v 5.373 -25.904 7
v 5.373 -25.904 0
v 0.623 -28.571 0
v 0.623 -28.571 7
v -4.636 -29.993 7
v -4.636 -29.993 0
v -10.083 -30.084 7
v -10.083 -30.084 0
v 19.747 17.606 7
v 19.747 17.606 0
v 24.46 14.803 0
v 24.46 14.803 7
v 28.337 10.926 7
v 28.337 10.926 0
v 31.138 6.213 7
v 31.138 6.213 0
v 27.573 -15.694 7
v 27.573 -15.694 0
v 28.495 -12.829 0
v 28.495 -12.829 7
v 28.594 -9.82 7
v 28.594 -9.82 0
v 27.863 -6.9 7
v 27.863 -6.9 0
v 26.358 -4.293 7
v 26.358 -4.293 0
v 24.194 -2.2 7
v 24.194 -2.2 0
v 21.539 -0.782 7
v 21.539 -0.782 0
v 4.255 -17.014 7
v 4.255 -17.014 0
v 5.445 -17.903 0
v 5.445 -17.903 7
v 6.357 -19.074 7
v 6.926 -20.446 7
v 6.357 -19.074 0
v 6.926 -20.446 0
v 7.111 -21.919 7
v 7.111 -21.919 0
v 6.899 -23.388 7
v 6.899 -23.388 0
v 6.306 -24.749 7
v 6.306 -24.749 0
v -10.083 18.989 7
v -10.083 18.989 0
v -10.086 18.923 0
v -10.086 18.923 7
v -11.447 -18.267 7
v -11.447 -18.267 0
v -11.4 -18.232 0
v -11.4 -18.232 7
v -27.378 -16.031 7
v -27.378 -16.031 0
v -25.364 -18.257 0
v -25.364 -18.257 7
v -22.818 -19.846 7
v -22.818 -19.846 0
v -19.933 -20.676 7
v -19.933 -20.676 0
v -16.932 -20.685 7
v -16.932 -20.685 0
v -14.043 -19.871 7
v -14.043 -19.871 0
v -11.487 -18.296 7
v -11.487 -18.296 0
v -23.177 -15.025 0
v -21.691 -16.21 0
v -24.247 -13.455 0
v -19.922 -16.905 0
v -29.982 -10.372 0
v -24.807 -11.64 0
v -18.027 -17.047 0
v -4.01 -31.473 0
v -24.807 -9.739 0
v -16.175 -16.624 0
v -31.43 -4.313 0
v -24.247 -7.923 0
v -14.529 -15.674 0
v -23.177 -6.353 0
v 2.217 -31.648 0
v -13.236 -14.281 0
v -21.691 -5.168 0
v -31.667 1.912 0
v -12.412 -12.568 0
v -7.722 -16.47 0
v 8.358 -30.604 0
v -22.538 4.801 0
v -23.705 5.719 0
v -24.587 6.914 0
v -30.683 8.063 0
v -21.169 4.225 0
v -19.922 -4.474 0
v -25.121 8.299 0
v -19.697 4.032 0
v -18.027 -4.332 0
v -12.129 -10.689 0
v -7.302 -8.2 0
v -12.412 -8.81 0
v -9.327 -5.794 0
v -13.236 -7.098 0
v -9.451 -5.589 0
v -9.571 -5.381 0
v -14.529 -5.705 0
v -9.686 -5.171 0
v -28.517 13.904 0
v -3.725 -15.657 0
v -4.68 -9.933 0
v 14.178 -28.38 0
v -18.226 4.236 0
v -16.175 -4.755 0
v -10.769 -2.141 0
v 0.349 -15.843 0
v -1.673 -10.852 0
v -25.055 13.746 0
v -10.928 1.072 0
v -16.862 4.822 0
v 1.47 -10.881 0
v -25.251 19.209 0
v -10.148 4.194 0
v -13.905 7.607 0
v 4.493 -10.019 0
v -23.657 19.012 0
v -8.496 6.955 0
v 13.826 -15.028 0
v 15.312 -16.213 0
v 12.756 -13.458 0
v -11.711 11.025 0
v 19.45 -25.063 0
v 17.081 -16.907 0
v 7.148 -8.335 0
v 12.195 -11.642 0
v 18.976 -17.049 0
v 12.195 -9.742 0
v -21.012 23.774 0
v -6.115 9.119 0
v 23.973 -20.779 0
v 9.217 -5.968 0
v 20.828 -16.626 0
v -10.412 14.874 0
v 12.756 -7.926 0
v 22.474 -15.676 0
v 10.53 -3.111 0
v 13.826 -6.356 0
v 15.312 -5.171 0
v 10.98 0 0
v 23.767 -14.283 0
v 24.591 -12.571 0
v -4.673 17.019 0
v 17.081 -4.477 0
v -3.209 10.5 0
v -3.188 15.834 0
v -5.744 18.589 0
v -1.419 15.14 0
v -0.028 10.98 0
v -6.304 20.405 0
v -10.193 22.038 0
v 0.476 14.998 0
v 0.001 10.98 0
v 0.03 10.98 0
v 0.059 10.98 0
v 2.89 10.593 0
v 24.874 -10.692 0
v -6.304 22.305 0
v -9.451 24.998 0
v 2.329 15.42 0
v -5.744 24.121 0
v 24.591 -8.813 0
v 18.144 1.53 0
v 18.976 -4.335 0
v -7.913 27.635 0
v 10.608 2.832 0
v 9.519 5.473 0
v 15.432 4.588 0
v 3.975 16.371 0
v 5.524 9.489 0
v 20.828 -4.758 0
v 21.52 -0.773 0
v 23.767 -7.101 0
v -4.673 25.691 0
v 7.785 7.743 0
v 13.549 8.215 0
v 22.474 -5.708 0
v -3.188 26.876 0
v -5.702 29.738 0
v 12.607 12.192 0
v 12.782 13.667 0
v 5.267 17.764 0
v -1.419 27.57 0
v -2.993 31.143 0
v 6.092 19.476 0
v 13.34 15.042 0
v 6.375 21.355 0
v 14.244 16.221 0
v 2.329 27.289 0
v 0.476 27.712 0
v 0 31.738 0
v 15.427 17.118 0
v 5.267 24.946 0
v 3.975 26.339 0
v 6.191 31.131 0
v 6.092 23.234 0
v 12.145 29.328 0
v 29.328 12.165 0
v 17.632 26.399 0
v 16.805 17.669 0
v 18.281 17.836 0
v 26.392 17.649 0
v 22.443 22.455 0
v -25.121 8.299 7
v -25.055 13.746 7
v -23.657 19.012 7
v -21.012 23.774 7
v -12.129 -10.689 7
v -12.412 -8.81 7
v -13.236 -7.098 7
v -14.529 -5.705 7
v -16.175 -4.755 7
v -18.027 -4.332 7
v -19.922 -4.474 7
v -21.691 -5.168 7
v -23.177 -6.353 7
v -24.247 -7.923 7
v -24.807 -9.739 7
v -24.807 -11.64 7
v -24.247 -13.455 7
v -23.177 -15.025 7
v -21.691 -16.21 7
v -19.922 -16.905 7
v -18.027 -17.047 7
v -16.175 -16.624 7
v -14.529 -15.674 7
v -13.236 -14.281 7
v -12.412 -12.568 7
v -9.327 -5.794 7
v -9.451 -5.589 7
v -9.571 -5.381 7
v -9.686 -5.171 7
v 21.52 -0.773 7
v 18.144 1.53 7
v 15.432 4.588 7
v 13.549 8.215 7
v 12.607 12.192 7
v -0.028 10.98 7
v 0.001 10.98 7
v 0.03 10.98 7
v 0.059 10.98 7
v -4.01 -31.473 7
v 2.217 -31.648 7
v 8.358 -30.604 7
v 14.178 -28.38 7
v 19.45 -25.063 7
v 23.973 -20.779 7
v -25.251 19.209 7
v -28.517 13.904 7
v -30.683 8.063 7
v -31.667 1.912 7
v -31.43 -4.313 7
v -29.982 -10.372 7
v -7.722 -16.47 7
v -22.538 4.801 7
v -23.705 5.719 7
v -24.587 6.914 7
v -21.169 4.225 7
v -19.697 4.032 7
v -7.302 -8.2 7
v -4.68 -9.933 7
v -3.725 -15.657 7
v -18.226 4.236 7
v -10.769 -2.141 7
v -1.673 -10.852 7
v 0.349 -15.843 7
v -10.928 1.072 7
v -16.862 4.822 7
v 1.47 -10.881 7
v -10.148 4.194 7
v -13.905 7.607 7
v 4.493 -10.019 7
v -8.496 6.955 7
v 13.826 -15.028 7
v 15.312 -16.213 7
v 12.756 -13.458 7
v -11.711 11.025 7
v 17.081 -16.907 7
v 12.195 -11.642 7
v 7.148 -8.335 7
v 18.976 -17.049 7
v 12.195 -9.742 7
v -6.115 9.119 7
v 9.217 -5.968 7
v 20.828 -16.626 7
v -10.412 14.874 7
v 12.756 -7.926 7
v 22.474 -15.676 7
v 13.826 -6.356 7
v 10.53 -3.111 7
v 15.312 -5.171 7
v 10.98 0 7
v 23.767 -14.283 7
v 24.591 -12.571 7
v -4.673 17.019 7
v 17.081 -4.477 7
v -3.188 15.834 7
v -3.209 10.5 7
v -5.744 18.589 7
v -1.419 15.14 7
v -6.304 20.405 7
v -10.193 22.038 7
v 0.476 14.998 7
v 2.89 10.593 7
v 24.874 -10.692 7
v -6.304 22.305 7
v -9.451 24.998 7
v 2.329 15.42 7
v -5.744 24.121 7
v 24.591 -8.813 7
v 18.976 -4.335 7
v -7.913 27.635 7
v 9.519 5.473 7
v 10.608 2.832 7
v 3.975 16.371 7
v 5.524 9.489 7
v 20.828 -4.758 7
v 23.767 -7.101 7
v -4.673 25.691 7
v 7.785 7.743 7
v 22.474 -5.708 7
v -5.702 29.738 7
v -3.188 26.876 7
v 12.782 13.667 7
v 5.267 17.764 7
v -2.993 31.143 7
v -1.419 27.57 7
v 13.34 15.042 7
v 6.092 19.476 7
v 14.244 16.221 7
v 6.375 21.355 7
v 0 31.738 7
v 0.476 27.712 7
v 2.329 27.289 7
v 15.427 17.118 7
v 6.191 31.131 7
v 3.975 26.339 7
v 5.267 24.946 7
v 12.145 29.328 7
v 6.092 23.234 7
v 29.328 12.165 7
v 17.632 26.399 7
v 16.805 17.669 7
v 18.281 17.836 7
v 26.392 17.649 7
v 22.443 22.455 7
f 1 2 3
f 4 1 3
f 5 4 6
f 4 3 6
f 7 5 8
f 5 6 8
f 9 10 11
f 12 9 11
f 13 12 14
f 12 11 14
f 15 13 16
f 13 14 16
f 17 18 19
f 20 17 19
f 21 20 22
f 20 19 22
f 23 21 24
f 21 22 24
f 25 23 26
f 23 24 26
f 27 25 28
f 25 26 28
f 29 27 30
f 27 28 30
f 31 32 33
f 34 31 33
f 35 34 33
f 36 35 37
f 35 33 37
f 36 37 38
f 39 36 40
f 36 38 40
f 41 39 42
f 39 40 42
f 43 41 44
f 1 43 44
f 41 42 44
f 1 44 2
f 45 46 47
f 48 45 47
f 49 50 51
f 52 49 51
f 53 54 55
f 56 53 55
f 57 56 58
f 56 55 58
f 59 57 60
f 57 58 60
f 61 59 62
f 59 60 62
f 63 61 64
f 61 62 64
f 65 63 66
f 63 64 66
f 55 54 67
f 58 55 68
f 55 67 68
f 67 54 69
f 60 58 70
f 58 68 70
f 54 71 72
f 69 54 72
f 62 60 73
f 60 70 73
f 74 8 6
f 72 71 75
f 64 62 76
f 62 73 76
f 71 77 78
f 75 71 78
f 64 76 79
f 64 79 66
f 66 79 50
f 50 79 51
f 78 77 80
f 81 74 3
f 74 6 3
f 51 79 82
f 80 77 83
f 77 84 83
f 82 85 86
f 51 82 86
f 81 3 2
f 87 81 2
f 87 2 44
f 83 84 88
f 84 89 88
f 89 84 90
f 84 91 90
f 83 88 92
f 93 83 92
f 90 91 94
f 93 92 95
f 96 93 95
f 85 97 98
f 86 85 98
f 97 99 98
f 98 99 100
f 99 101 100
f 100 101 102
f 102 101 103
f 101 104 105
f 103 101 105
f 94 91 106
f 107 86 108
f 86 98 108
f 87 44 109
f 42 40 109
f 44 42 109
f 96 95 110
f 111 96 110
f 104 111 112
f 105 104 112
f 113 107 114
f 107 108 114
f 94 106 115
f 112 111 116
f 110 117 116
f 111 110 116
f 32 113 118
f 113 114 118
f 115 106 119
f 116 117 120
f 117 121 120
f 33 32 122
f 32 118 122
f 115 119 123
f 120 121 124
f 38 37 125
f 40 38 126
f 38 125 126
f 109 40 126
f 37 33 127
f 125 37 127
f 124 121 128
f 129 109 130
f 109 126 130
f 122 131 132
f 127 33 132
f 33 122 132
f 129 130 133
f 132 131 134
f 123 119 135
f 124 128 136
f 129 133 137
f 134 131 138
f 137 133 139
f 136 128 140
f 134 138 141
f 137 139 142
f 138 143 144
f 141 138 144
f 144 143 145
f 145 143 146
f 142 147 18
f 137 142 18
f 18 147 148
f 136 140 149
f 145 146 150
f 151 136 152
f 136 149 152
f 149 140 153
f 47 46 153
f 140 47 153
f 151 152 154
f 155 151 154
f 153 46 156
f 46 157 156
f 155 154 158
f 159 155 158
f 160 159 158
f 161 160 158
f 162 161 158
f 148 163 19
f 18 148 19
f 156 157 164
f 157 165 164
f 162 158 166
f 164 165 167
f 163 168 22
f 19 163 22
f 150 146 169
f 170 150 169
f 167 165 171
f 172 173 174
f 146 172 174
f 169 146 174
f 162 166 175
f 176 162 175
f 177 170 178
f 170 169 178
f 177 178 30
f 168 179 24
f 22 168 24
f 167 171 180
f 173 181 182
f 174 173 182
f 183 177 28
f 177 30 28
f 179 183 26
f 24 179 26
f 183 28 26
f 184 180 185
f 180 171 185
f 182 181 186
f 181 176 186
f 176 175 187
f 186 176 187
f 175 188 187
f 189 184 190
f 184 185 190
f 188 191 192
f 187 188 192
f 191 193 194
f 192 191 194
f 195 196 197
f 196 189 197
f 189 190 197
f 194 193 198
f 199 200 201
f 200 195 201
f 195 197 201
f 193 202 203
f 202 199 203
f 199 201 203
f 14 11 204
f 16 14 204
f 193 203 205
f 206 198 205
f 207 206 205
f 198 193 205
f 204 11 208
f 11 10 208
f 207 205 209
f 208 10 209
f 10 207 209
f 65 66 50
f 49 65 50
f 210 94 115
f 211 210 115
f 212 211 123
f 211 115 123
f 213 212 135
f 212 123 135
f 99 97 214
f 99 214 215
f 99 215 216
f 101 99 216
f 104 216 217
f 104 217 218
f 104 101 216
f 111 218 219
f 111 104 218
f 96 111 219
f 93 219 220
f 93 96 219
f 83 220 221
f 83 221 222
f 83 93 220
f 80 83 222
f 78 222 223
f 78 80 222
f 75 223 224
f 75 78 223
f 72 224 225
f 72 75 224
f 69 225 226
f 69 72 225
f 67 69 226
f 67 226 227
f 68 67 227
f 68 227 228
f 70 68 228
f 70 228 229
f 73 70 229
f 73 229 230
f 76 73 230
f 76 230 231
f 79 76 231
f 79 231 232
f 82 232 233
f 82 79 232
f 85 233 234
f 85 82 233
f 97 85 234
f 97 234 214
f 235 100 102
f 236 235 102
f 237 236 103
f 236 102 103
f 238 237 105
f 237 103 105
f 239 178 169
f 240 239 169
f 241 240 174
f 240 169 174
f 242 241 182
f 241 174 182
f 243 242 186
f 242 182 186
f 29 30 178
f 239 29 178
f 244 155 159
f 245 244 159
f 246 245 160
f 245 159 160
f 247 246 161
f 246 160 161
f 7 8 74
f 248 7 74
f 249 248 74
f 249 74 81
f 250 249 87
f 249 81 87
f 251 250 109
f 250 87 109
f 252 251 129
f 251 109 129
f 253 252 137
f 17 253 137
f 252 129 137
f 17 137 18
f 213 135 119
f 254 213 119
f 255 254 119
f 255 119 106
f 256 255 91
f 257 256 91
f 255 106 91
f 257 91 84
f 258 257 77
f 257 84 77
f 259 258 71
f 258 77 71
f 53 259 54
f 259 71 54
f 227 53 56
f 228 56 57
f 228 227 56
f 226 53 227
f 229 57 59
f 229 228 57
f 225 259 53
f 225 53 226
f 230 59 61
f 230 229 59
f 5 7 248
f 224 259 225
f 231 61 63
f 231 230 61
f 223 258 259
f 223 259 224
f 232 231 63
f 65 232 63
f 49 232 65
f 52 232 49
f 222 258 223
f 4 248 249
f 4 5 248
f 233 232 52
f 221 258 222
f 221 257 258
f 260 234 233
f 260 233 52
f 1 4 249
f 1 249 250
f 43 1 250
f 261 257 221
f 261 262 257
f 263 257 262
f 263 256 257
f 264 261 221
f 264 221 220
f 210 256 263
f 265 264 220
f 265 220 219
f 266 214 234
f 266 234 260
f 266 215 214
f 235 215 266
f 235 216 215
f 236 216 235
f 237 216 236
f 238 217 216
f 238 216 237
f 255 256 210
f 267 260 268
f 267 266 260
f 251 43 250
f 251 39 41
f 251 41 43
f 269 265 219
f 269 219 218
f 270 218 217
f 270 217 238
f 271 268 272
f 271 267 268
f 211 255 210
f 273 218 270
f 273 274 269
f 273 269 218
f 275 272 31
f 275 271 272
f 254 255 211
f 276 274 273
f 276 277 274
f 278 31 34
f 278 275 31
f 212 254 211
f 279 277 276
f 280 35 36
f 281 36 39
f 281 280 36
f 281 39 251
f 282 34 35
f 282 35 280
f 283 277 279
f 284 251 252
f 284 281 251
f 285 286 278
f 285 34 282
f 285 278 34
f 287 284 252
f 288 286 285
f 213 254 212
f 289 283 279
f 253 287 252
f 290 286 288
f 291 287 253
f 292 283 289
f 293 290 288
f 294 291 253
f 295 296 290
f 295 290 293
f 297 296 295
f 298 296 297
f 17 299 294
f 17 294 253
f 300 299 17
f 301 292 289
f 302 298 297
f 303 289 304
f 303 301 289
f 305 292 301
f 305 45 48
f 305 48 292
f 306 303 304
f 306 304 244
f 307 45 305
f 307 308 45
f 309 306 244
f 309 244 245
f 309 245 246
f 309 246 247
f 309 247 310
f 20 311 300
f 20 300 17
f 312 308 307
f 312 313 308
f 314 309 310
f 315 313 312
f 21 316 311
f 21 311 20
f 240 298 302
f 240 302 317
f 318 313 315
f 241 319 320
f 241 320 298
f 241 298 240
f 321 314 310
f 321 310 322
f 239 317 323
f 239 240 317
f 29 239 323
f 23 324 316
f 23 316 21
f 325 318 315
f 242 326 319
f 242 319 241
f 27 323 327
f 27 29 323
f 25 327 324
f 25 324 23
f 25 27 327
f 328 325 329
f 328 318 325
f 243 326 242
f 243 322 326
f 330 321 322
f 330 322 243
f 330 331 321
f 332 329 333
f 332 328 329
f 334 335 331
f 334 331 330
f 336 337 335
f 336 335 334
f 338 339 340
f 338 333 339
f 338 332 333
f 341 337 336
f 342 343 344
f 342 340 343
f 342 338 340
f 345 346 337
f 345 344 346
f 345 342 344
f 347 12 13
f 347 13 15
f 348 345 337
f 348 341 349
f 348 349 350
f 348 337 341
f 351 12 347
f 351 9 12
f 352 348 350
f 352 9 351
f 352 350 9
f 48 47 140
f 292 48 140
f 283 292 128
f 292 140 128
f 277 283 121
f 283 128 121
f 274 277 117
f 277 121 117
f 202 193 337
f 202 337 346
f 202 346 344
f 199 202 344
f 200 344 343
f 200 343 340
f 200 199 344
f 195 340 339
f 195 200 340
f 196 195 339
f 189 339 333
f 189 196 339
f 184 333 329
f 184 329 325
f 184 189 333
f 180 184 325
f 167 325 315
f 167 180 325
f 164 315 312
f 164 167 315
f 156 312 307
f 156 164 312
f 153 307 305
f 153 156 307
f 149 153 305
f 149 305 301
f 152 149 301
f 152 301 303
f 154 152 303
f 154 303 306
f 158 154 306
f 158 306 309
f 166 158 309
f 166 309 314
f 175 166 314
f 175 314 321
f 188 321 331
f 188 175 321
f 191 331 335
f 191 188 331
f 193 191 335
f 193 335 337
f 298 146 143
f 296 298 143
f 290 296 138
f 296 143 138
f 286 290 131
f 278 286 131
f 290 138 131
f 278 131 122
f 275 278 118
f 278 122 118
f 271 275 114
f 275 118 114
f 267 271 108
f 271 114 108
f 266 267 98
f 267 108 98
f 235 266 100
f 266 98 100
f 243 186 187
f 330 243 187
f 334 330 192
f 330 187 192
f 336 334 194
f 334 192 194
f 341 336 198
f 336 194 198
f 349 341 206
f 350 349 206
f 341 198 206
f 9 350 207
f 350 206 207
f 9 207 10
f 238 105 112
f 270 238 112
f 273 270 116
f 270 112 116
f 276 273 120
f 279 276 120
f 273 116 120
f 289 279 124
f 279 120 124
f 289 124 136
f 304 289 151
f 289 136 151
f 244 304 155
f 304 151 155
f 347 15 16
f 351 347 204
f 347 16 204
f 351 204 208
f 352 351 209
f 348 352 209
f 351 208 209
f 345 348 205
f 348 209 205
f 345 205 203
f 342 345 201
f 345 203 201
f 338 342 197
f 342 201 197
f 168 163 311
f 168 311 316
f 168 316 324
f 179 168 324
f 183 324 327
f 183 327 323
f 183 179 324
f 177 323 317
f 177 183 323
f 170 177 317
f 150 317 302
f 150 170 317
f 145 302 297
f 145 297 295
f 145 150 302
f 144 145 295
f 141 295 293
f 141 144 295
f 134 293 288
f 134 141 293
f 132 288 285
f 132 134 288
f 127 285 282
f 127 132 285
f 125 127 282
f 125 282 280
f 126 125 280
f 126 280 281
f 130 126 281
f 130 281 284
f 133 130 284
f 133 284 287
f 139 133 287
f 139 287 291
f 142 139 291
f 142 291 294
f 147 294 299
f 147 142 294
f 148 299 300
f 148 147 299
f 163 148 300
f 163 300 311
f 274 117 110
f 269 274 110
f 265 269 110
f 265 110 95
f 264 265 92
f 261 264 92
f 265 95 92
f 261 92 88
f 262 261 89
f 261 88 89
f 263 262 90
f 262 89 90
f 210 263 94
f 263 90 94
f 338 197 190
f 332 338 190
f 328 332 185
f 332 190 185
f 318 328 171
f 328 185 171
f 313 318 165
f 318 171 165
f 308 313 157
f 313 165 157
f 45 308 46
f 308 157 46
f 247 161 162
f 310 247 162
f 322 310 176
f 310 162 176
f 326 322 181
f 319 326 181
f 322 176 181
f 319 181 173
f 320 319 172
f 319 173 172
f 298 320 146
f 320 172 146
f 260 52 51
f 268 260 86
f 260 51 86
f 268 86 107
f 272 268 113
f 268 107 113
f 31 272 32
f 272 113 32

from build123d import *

# Parameters (mm, degrees)
F0_R     = 6.375
F1_DEPTH = 7


with BuildPart() as f1:
    # F0 (on Top) → F1 (new body)
    with BuildSketch(Plane.XY):
        with BuildLine():
            Line((-11.447235, -18.267009), (-11.400234, -18.231657))
            ThreePointArc((-11.400234, -18.231657), (-3.725439, -15.657485), (4.255035, -17.014272))
            ThreePointArc((4.255035, -17.014272), (7.067716, -21.175926), (5.373267, -25.904496))
            ThreePointArc((5.373267, -25.904496), (-1.962484, -29.445234), (-10.082932, -30.084303))
            ThreePointArc((-10.082932, -30.084303), (11.322753, -29.635141), (27.572568, -15.694242))
            ThreePointArc((27.572568, -15.694242), (27.863052, -6.900018), (21.539104, -0.781975))
            Line((21.539104, -0.781975), (21.519969, -0.772949))
            ThreePointArc((21.519969, -0.772949), (15.432301, 4.588143), (12.607275, 12.192104))
            ThreePointArc((12.607275, 12.192104), (14.805032, 16.708784), (19.747318, 17.605634))
            ThreePointArc((19.747318, 17.605634), (26.519114, 12.985588), (31.13793, 6.212954))
            ThreePointArc((31.13793, 6.212954), (20.134618, 24.54515), (0, 31.738163))
            ThreePointArc((0, 31.738163), (-7.913144, 27.634586), (-10.082506, 18.988716))
            Line((-10.082506, 18.988716), (-10.086068, 18.923081))
            ThreePointArc((-10.086068, 18.923081), (-11.71126, 11.025443), (-16.862309, 4.822168))
            ThreePointArc((-16.862309, 4.822168), (-21.872747, 4.467142), (-25.120585, 8.298862))
            ThreePointArc((-25.120585, 8.298862), (-24.519079, 16.422178), (-21.012304, 23.774227))
            ThreePointArc((-21.012304, 23.774227), (-31.326161, 5.011778), (-27.377897, -16.031423))
            ThreePointArc((-27.377897, -16.031423), (-19.93322, -20.676414), (-11.487312, -18.296124))
            Line((-11.487312, -18.296124), (-11.447235, -18.267009))
        make_face()
        with Locations((-18.503675, -10.689365)):
            Circle(F0_R, mode=Mode.SUBTRACT)
        with BuildLine():
            ThreePointArc((0.05941, 10.979839), (7.785009, 7.742999), (10.98, 0))
            ThreePointArc((10.98, 0), (3.012852, -10.558557), (-9.32658, -5.79442))
            ThreePointArc((-9.32658, -5.79442), (-9.51149, -5.485613), (-9.68618, -5.170911))
            ThreePointArc((-9.68618, -5.170911), (-9.423582, 5.63529), (-0.027977, 10.979964))
            ThreePointArc((-0.027977, 10.979964), (0.015717, 10.979989), (0.05941, 10.979839))
        make_face(mode=Mode.SUBTRACT)
        with Locations((18.499237, -10.691927)):
            Circle(F0_R, mode=Mode.SUBTRACT)
        with Locations((0, 21.354815)):
            Circle(F0_R, mode=Mode.SUBTRACT)
    extrude(amount=F1_DEPTH)


solid = f1.part
